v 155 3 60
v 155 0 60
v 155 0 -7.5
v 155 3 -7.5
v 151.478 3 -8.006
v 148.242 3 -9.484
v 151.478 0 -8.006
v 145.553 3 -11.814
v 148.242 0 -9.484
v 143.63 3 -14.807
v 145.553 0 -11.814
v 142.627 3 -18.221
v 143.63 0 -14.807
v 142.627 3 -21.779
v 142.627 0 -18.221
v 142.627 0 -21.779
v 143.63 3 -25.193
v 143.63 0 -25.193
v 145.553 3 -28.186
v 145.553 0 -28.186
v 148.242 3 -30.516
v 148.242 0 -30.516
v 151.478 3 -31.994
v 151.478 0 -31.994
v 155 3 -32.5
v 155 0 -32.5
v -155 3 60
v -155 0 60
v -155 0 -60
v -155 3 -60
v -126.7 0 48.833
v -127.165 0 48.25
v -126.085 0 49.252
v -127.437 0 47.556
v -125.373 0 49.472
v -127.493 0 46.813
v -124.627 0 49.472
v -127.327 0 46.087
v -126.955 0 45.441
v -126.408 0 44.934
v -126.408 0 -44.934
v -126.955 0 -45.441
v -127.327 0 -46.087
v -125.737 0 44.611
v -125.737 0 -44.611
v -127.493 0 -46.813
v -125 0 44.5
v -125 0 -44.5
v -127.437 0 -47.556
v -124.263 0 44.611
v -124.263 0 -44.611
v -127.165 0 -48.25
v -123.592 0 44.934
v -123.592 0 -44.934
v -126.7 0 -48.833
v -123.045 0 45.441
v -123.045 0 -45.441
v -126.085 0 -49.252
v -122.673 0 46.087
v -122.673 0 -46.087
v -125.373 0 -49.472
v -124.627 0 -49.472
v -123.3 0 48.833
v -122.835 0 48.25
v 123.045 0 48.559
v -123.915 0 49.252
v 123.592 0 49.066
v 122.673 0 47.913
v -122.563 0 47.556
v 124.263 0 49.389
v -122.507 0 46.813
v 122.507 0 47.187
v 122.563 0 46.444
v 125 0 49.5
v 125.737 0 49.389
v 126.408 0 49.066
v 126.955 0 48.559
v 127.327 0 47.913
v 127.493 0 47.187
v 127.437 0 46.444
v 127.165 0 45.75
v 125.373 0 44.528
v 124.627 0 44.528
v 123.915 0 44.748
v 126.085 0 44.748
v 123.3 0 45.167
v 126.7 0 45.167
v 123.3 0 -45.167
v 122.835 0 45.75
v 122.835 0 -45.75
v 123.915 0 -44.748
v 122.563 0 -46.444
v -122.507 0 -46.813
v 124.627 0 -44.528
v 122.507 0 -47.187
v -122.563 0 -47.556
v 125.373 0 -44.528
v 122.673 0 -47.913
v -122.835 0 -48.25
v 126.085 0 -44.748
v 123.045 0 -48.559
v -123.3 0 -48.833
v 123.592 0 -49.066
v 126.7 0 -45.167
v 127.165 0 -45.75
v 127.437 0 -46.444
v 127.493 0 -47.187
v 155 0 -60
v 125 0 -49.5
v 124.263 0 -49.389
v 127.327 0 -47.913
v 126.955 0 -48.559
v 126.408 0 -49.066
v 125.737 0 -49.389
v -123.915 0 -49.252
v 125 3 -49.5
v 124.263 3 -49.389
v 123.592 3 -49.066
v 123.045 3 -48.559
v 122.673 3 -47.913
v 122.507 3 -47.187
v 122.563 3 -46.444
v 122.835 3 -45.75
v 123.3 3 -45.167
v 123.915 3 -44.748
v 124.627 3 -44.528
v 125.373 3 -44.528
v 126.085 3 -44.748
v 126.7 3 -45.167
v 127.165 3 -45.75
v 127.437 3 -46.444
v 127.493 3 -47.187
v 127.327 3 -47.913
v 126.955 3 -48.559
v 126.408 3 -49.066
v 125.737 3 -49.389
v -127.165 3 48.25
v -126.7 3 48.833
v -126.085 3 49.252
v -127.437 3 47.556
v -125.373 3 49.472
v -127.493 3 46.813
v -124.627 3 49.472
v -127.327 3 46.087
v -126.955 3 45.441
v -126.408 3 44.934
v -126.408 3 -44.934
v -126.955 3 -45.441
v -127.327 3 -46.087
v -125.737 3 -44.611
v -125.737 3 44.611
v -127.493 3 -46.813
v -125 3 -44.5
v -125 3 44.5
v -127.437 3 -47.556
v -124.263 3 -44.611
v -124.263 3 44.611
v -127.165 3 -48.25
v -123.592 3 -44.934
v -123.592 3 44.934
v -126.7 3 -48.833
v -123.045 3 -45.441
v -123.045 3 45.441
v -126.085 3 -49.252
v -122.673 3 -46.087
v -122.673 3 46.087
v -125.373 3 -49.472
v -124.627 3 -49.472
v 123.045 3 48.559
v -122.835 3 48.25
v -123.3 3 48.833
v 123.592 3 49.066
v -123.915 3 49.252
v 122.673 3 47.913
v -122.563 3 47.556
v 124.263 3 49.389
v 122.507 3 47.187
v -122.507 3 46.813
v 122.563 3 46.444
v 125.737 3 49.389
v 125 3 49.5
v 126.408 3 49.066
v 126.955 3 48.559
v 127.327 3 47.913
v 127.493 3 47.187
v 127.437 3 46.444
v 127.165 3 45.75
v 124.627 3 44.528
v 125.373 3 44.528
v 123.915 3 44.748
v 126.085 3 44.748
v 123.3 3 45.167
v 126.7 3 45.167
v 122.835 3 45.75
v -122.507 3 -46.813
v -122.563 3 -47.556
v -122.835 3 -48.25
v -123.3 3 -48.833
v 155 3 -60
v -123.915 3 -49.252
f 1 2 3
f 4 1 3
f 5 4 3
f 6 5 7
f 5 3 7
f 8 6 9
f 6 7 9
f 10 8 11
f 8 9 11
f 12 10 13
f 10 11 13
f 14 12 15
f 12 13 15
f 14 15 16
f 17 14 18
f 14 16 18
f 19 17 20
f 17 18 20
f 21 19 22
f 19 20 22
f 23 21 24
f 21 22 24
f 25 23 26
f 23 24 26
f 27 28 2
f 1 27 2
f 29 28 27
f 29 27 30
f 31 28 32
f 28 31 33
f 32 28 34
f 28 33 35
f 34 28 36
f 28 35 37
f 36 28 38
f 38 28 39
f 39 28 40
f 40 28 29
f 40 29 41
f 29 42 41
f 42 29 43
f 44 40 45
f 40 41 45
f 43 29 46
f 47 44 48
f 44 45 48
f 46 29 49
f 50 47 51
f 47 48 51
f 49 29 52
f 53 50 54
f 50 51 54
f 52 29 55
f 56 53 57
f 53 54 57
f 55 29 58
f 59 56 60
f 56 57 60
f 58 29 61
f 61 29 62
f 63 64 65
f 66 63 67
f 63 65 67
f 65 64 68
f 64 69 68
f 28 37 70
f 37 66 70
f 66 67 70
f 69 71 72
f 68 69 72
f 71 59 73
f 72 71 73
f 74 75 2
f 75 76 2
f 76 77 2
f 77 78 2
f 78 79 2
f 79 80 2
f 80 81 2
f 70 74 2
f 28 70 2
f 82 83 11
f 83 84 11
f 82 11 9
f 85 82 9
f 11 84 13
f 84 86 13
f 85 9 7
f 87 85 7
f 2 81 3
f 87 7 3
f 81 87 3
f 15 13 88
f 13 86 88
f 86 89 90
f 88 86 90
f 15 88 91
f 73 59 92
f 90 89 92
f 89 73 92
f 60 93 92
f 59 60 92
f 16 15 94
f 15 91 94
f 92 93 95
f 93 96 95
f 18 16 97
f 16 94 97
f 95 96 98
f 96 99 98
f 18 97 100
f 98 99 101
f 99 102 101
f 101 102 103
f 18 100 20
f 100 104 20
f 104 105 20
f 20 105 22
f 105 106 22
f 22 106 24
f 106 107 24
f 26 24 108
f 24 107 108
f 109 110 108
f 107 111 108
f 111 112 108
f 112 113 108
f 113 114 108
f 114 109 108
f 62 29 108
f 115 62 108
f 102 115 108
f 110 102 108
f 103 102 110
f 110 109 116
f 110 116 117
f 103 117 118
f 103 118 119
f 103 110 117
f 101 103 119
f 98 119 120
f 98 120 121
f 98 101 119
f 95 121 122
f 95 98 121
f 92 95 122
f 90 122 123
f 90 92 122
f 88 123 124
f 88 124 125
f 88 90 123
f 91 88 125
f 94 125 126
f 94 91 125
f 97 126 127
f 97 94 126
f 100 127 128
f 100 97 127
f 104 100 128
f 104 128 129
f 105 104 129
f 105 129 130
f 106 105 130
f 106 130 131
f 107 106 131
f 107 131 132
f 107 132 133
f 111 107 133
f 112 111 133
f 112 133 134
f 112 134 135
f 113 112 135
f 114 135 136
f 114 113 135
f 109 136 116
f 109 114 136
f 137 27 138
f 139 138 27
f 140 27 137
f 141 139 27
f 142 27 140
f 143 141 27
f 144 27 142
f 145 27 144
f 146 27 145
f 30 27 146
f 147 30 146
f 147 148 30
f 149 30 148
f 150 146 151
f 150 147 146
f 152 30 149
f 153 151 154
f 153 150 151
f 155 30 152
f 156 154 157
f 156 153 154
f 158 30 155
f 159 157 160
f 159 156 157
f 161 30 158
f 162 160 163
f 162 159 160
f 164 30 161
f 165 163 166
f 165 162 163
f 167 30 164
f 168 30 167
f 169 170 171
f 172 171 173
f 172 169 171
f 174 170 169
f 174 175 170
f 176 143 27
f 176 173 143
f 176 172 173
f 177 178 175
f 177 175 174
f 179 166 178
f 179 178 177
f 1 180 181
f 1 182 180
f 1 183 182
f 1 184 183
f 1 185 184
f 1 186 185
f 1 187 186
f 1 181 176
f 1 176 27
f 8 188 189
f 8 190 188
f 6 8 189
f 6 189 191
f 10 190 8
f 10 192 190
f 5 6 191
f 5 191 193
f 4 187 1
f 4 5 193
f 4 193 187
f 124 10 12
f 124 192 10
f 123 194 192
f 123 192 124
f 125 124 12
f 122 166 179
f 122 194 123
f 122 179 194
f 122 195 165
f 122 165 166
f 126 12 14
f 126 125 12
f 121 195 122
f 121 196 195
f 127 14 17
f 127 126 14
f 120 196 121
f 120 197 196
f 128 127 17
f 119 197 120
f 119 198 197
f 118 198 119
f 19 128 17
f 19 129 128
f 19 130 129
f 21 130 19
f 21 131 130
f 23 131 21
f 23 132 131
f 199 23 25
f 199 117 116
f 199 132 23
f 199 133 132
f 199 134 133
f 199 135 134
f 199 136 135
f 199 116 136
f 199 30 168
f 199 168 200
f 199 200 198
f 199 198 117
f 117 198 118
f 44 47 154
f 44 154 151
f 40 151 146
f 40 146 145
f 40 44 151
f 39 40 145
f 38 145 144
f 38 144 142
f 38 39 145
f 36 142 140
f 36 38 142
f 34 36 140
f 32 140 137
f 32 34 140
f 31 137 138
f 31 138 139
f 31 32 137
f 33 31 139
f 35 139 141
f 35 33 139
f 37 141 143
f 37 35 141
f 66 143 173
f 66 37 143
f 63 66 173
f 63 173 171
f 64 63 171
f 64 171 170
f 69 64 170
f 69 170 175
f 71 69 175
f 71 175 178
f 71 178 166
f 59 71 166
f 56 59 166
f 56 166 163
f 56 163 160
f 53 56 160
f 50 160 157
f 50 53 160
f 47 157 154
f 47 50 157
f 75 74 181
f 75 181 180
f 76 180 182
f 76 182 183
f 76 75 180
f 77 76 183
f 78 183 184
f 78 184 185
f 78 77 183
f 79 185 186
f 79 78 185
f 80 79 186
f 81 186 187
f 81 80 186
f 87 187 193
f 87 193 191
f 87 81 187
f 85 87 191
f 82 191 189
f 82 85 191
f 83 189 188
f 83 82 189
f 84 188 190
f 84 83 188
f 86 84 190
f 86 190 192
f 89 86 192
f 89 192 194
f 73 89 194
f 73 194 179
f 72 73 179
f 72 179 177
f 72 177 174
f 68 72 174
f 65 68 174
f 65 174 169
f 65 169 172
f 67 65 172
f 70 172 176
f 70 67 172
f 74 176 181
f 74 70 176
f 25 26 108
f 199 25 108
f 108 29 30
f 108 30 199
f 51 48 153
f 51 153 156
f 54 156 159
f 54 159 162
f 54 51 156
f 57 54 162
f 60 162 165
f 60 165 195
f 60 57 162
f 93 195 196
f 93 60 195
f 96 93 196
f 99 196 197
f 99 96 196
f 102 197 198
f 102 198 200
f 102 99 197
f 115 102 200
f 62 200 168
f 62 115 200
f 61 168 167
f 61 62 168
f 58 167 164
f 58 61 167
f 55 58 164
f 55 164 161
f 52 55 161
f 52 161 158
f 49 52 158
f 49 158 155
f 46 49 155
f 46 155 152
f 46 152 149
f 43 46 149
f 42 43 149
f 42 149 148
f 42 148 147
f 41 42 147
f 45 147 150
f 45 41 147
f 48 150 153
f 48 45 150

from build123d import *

# Parameters (mm, degrees)
SKETCH1_W           = 310
SKETCH1_H           = 120
SKETCH1_R           = 2.5
BOSS_EXTRUDE1_DEPTH = 3
CUT_EXTRUDE1_REACH  = 168.235
SKETCH2_R           = 12.5


with BuildPart() as part:
    # Sketch1 → Boss-Extrude1 (new body)
    with BuildSketch(Plane(origin=(0, 0, 0), x_dir=(1, 0, 0), z_dir=(0, 1, 0))):
        Rectangle(SKETCH1_W, SKETCH1_H)
        with Locations(Location((-125, 47, 0), (0, 0, 270))):
            Circle(SKETCH1_R, mode=Mode.SUBTRACT)
        with Locations(Location((125, 47, 0), (0, 0, 90))):
            Circle(SKETCH1_R, mode=Mode.SUBTRACT)
        with Locations(Location((125, -47, 0), (0, 0, 270))):
            Circle(SKETCH1_R, mode=Mode.SUBTRACT)
        with Locations(Location((-125, -47, 0), (0, 0, 90))):
            Circle(SKETCH1_R, mode=Mode.SUBTRACT)
    extrude(amount=BOSS_EXTRUDE1_DEPTH)

    # Sketch2 → Cut-Extrude1 (cut, up to next)
    with BuildSketch(Plane.XZ, mode=Mode.PRIVATE) as cut_extrude1_sk1:
        with Locations((155, -20)):
            Circle(SKETCH2_R)
    cut_extrude1_tool1 = extrude(cut_extrude1_sk1.sketch, amount=-CUT_EXTRUDE1_REACH, mode=Mode.PRIVATE) & part.part
    add(cut_extrude1_tool1.solids().sort_by_distance((155, 0, -20))[0], mode=Mode.SUBTRACT)


solid = part.part
